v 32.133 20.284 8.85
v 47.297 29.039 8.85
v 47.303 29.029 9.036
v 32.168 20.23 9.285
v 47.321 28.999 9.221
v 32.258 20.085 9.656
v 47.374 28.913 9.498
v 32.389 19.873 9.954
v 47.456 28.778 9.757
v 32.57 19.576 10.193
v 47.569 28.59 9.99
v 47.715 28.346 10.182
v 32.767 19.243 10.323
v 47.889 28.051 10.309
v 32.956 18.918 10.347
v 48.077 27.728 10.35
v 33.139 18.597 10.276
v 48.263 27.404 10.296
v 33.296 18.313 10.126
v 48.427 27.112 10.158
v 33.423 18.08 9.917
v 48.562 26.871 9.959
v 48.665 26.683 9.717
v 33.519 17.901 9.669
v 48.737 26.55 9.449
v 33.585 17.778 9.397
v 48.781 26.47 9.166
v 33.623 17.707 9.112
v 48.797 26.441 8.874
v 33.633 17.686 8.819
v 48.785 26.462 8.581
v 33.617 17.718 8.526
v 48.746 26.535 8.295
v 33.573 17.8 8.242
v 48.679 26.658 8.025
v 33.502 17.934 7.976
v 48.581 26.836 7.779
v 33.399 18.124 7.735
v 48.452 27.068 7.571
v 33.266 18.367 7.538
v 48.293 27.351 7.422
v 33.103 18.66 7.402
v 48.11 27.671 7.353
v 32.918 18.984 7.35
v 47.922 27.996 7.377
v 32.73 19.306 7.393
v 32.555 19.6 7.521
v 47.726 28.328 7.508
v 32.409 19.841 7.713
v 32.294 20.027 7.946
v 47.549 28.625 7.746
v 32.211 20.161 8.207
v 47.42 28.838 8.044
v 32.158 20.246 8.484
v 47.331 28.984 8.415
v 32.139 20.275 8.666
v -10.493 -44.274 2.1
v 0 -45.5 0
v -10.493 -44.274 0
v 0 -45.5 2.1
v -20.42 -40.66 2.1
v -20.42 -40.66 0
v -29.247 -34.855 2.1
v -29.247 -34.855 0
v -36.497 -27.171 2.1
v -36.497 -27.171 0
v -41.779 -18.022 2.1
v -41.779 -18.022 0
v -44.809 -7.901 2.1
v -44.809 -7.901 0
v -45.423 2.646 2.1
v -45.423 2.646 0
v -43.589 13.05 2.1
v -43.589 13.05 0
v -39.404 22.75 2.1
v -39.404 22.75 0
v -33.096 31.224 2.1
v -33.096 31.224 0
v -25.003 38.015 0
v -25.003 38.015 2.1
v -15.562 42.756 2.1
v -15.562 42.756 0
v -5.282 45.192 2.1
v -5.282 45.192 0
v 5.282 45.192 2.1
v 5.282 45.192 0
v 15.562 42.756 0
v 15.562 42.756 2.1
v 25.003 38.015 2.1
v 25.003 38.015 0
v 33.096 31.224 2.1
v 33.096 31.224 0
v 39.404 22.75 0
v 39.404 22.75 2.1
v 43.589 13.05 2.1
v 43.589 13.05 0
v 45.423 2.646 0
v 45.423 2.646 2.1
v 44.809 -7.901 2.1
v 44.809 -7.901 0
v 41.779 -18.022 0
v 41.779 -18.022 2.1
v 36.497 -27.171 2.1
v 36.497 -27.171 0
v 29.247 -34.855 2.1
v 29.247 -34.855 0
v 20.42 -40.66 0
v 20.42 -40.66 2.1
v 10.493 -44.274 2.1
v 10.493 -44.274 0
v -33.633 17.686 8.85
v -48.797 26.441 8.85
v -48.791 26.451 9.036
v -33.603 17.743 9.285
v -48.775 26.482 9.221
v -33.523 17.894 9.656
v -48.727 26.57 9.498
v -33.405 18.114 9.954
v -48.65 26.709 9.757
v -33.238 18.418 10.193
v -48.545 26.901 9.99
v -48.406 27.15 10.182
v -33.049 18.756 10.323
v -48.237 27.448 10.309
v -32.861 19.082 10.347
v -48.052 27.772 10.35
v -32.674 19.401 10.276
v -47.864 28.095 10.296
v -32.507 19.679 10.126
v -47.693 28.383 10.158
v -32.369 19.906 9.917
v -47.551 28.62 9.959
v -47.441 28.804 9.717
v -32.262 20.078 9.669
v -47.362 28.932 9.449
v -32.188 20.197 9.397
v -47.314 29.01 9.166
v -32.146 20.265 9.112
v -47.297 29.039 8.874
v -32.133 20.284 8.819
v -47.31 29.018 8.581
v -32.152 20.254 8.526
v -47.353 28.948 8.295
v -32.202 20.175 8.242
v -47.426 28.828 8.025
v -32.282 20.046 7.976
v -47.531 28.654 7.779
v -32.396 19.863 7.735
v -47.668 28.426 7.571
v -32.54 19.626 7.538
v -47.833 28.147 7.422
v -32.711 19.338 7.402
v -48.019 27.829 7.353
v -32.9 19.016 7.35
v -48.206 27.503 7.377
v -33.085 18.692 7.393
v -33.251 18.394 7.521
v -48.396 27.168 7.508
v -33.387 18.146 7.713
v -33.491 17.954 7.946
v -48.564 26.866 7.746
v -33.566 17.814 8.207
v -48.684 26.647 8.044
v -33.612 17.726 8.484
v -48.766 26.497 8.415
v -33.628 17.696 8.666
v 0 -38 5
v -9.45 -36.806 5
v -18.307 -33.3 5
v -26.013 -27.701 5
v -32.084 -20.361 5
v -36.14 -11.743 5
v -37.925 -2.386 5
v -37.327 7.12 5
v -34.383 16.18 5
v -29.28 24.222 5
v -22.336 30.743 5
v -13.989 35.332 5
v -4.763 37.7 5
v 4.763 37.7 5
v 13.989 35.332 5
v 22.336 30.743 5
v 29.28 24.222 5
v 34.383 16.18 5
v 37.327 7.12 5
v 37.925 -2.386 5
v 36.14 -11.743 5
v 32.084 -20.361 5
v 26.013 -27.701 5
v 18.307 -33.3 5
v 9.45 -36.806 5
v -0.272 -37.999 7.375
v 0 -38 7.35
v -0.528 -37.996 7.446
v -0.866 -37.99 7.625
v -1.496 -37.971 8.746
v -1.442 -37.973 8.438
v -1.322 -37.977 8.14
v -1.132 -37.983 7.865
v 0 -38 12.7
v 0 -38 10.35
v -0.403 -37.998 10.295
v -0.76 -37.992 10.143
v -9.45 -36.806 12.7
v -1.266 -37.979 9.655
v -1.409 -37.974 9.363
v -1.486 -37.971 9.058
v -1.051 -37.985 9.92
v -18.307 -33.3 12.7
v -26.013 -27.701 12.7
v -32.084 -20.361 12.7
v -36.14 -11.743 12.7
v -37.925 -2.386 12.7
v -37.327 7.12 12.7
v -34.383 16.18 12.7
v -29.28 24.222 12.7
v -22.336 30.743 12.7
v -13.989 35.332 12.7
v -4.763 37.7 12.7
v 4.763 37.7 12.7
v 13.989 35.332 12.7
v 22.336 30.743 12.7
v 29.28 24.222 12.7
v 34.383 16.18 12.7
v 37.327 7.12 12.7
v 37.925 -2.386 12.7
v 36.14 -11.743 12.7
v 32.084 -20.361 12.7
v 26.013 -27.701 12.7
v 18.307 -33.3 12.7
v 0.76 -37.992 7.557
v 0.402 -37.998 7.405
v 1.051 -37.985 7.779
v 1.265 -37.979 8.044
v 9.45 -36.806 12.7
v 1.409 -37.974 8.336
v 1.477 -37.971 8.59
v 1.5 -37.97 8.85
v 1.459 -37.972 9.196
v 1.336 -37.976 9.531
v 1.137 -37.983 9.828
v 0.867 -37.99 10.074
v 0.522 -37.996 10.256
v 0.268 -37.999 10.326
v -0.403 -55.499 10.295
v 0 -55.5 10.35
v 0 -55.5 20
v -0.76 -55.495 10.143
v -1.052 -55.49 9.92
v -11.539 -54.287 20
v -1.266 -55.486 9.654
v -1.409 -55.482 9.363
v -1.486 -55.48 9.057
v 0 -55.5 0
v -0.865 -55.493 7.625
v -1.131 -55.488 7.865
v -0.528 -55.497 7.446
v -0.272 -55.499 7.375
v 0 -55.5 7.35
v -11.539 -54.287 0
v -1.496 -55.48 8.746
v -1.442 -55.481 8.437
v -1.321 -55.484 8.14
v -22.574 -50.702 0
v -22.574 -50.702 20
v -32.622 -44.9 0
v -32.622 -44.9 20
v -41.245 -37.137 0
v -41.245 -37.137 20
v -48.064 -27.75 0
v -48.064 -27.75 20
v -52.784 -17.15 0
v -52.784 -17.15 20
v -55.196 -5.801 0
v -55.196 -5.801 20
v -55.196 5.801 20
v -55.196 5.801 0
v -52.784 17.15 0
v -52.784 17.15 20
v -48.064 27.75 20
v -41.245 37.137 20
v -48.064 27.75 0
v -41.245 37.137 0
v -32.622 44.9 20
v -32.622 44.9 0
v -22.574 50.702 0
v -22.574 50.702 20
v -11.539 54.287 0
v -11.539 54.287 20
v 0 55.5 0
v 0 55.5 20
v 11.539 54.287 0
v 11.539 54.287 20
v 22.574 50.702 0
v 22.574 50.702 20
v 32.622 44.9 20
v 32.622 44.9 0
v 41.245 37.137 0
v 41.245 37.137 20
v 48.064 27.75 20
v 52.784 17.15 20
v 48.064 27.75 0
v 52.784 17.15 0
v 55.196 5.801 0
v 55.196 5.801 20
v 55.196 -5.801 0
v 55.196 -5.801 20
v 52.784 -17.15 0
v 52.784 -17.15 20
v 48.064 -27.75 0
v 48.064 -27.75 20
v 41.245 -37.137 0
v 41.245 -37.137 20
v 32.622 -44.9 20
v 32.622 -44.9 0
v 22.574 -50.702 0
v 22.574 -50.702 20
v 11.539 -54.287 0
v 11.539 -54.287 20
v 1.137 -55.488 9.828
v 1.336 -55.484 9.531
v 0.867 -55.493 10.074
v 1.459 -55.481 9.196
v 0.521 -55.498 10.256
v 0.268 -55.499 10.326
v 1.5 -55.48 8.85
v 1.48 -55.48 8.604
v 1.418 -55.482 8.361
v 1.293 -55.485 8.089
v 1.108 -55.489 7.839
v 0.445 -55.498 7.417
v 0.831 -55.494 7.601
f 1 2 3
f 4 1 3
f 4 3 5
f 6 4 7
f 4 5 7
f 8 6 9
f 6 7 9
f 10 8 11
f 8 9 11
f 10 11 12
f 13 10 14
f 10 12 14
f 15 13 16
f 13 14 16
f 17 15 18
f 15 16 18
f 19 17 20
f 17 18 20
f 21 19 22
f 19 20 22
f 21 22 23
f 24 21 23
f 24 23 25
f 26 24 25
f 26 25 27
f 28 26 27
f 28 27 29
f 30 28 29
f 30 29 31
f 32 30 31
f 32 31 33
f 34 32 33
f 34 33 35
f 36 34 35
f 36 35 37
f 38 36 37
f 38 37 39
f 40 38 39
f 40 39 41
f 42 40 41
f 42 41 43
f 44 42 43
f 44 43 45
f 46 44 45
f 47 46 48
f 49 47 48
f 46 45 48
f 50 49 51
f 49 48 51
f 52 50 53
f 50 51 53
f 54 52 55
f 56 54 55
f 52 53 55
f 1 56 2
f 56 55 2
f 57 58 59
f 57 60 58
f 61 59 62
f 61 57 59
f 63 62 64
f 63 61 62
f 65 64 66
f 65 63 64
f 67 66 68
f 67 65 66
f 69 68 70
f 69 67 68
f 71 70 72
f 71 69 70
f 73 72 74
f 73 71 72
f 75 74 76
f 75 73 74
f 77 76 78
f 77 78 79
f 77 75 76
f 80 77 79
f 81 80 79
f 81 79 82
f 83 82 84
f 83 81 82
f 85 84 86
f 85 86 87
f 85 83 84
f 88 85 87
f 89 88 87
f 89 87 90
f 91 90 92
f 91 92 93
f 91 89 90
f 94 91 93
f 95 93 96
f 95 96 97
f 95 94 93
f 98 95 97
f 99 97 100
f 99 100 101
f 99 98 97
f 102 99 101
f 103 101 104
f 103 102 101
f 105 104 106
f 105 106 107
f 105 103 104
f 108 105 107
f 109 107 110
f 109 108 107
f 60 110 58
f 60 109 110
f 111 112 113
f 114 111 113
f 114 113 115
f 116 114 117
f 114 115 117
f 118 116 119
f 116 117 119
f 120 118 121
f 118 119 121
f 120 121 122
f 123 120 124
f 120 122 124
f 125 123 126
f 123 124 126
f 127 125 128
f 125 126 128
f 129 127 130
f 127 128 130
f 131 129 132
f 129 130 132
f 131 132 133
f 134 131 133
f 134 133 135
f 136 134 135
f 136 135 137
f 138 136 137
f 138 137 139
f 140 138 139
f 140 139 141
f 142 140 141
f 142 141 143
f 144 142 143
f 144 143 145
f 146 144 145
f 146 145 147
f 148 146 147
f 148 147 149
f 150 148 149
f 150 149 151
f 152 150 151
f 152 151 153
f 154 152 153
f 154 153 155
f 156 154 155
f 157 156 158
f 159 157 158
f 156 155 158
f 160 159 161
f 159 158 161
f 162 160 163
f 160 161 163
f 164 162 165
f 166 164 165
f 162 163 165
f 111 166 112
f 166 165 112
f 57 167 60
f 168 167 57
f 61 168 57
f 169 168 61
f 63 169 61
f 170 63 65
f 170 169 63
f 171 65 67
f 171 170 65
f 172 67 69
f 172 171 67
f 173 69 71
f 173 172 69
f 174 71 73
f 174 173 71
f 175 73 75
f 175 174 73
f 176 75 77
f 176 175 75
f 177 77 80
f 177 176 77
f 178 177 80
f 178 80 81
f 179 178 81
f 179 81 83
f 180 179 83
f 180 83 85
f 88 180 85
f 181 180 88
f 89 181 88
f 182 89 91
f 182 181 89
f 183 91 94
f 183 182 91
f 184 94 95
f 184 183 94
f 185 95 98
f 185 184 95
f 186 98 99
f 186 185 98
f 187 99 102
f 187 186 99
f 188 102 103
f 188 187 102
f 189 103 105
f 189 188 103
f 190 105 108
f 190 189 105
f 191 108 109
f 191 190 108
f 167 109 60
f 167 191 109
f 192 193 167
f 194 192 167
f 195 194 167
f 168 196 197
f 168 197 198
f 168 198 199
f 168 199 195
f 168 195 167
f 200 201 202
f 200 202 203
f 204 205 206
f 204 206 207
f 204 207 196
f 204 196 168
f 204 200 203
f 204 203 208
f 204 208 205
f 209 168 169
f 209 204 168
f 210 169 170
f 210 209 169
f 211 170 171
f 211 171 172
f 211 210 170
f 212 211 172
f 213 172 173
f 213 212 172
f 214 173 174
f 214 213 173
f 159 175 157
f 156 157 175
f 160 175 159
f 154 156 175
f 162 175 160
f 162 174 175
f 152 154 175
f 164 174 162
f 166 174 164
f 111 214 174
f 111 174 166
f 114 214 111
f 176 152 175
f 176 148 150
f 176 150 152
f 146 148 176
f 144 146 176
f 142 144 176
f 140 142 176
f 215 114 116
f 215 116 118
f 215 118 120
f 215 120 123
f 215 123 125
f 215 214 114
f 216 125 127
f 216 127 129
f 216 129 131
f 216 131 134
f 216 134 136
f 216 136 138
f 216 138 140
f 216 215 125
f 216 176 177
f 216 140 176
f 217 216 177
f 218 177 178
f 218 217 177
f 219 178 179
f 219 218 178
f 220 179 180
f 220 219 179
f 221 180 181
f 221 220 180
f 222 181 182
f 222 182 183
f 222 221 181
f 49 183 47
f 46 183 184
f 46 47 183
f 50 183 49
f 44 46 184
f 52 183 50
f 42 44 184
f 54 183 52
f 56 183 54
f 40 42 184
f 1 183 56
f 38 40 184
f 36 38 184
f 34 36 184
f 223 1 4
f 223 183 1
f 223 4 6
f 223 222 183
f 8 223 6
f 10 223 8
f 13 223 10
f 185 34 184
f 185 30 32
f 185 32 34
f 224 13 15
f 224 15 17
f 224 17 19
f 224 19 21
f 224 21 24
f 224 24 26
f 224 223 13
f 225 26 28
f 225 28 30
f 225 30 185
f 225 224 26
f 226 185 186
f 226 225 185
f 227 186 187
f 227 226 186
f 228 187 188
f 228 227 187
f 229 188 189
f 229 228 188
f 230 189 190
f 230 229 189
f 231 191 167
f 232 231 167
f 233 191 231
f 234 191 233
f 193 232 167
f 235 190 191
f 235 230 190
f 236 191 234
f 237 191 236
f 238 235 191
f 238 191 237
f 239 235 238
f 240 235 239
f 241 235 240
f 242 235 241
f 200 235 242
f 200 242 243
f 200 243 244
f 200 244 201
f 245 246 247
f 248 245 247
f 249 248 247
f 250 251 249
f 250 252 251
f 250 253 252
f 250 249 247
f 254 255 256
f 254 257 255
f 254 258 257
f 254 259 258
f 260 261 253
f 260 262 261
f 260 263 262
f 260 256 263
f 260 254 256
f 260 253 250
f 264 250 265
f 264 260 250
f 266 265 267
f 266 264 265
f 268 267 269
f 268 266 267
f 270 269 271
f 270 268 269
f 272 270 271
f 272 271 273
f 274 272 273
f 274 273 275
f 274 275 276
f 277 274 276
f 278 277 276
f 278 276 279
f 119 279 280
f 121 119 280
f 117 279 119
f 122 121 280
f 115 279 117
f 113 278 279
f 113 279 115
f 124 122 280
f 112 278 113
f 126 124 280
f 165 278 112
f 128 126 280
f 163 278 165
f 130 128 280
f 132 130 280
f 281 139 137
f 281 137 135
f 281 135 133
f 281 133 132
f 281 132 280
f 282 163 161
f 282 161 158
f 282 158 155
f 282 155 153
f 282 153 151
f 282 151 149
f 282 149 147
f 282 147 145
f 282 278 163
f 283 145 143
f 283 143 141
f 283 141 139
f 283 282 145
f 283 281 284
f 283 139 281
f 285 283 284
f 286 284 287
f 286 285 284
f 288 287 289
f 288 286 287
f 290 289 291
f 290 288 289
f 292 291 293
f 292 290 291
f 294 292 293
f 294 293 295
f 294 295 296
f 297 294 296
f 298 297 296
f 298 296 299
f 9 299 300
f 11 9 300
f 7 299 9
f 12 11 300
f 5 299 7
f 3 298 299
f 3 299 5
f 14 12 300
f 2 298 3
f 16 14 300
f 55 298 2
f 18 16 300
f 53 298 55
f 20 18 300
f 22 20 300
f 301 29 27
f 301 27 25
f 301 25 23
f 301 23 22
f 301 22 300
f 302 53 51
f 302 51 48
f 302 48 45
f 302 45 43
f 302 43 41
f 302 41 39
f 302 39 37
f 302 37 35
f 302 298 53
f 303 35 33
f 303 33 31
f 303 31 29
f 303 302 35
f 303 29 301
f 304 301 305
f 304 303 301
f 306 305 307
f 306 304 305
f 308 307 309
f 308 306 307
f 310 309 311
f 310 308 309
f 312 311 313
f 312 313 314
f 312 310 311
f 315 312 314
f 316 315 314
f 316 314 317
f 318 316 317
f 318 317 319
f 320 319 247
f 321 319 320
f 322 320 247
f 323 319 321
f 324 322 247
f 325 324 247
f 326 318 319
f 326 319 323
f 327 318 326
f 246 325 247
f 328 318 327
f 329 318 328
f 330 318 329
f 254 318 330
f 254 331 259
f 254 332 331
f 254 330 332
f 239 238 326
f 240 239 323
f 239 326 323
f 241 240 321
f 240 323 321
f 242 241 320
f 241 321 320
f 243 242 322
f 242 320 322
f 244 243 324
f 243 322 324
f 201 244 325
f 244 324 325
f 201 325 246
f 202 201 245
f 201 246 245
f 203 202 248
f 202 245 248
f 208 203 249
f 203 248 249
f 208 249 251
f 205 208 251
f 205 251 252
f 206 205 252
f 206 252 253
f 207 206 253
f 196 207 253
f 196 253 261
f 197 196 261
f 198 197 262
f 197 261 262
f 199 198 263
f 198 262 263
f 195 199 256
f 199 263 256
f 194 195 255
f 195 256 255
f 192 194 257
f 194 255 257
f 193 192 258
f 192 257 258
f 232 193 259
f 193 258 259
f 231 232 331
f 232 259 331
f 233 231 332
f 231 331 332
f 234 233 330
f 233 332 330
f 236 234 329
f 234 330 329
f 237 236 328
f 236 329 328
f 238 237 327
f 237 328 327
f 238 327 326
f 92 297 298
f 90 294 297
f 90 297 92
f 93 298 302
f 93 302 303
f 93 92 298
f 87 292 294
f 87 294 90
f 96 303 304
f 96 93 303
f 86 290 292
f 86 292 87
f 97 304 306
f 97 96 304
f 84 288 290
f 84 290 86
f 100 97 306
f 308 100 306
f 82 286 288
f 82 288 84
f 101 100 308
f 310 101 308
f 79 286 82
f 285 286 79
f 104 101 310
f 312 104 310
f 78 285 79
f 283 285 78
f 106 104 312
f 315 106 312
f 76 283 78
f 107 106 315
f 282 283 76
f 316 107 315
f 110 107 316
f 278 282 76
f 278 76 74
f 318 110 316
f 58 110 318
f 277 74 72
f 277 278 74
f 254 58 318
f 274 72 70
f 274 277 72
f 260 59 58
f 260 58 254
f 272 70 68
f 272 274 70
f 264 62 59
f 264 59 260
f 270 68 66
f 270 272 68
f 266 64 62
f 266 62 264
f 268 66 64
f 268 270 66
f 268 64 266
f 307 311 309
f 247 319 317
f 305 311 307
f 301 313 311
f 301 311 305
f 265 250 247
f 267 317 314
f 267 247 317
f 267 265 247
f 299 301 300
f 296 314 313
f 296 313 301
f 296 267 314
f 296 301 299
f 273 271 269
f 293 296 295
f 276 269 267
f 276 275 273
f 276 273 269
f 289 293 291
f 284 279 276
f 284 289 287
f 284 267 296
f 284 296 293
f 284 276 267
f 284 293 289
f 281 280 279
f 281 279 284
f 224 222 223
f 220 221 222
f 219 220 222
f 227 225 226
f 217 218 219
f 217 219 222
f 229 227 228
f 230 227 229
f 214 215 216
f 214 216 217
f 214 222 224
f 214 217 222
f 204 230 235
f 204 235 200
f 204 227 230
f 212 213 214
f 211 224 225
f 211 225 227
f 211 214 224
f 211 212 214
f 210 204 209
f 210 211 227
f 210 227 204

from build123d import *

# Parameters (mm, degrees)
F7_R      = 1.5
F10_DEPTH = 17.530616906
F8_R      = 1.5
F11_DEPTH = 17.530616906
F9_R      = 1.5
F12_DEPTH = 17.5306169047


with BuildPart() as f1:
    # F0 (on Right) → F1 (revolve)
    with BuildSketch(Plane.YZ):
        Polygon((-55.5, 0), (-45.5, 0), (-45.5, 2.1), (-38, 5), (-38, 12.7), (0, 12.7), (0, 20), (-55.5, 20), align=None)
    revolve(axis=Axis((0, 0, -2.8341766447), (0, 0, -1)))

    # F7 (on line) → F10 (cut, through all)
    with BuildSketch(Plane(origin=(48.06440991, 27.75, 0), x_dir=(-0.5, 0.8660254038, 0), z_dir=(0.8660254038, 0.5, 0))):
        with Locations((0, 8.85)):
            Circle(F7_R)
    extrude(amount=-F10_DEPTH, mode=Mode.SUBTRACT)

    # F8 (on line) → F11 (cut, through all)
    with BuildSketch(Plane(origin=(-48.06440991, 27.75, 0), x_dir=(-0.5, -0.8660254038, 0), z_dir=(-0.8660254038, 0.5, 0))):
        with Locations((0, 8.85)):
            Circle(F8_R)
    extrude(amount=-F11_DEPTH, mode=Mode.SUBTRACT)

    # F9 (on line) → F12 (cut, through all)
    with BuildSketch(Plane.XZ.offset(55.5)):
        with Locations((0, 8.85)):
            Circle(F9_R)
    extrude(amount=-F12_DEPTH, mode=Mode.SUBTRACT)


solid = f1.part
